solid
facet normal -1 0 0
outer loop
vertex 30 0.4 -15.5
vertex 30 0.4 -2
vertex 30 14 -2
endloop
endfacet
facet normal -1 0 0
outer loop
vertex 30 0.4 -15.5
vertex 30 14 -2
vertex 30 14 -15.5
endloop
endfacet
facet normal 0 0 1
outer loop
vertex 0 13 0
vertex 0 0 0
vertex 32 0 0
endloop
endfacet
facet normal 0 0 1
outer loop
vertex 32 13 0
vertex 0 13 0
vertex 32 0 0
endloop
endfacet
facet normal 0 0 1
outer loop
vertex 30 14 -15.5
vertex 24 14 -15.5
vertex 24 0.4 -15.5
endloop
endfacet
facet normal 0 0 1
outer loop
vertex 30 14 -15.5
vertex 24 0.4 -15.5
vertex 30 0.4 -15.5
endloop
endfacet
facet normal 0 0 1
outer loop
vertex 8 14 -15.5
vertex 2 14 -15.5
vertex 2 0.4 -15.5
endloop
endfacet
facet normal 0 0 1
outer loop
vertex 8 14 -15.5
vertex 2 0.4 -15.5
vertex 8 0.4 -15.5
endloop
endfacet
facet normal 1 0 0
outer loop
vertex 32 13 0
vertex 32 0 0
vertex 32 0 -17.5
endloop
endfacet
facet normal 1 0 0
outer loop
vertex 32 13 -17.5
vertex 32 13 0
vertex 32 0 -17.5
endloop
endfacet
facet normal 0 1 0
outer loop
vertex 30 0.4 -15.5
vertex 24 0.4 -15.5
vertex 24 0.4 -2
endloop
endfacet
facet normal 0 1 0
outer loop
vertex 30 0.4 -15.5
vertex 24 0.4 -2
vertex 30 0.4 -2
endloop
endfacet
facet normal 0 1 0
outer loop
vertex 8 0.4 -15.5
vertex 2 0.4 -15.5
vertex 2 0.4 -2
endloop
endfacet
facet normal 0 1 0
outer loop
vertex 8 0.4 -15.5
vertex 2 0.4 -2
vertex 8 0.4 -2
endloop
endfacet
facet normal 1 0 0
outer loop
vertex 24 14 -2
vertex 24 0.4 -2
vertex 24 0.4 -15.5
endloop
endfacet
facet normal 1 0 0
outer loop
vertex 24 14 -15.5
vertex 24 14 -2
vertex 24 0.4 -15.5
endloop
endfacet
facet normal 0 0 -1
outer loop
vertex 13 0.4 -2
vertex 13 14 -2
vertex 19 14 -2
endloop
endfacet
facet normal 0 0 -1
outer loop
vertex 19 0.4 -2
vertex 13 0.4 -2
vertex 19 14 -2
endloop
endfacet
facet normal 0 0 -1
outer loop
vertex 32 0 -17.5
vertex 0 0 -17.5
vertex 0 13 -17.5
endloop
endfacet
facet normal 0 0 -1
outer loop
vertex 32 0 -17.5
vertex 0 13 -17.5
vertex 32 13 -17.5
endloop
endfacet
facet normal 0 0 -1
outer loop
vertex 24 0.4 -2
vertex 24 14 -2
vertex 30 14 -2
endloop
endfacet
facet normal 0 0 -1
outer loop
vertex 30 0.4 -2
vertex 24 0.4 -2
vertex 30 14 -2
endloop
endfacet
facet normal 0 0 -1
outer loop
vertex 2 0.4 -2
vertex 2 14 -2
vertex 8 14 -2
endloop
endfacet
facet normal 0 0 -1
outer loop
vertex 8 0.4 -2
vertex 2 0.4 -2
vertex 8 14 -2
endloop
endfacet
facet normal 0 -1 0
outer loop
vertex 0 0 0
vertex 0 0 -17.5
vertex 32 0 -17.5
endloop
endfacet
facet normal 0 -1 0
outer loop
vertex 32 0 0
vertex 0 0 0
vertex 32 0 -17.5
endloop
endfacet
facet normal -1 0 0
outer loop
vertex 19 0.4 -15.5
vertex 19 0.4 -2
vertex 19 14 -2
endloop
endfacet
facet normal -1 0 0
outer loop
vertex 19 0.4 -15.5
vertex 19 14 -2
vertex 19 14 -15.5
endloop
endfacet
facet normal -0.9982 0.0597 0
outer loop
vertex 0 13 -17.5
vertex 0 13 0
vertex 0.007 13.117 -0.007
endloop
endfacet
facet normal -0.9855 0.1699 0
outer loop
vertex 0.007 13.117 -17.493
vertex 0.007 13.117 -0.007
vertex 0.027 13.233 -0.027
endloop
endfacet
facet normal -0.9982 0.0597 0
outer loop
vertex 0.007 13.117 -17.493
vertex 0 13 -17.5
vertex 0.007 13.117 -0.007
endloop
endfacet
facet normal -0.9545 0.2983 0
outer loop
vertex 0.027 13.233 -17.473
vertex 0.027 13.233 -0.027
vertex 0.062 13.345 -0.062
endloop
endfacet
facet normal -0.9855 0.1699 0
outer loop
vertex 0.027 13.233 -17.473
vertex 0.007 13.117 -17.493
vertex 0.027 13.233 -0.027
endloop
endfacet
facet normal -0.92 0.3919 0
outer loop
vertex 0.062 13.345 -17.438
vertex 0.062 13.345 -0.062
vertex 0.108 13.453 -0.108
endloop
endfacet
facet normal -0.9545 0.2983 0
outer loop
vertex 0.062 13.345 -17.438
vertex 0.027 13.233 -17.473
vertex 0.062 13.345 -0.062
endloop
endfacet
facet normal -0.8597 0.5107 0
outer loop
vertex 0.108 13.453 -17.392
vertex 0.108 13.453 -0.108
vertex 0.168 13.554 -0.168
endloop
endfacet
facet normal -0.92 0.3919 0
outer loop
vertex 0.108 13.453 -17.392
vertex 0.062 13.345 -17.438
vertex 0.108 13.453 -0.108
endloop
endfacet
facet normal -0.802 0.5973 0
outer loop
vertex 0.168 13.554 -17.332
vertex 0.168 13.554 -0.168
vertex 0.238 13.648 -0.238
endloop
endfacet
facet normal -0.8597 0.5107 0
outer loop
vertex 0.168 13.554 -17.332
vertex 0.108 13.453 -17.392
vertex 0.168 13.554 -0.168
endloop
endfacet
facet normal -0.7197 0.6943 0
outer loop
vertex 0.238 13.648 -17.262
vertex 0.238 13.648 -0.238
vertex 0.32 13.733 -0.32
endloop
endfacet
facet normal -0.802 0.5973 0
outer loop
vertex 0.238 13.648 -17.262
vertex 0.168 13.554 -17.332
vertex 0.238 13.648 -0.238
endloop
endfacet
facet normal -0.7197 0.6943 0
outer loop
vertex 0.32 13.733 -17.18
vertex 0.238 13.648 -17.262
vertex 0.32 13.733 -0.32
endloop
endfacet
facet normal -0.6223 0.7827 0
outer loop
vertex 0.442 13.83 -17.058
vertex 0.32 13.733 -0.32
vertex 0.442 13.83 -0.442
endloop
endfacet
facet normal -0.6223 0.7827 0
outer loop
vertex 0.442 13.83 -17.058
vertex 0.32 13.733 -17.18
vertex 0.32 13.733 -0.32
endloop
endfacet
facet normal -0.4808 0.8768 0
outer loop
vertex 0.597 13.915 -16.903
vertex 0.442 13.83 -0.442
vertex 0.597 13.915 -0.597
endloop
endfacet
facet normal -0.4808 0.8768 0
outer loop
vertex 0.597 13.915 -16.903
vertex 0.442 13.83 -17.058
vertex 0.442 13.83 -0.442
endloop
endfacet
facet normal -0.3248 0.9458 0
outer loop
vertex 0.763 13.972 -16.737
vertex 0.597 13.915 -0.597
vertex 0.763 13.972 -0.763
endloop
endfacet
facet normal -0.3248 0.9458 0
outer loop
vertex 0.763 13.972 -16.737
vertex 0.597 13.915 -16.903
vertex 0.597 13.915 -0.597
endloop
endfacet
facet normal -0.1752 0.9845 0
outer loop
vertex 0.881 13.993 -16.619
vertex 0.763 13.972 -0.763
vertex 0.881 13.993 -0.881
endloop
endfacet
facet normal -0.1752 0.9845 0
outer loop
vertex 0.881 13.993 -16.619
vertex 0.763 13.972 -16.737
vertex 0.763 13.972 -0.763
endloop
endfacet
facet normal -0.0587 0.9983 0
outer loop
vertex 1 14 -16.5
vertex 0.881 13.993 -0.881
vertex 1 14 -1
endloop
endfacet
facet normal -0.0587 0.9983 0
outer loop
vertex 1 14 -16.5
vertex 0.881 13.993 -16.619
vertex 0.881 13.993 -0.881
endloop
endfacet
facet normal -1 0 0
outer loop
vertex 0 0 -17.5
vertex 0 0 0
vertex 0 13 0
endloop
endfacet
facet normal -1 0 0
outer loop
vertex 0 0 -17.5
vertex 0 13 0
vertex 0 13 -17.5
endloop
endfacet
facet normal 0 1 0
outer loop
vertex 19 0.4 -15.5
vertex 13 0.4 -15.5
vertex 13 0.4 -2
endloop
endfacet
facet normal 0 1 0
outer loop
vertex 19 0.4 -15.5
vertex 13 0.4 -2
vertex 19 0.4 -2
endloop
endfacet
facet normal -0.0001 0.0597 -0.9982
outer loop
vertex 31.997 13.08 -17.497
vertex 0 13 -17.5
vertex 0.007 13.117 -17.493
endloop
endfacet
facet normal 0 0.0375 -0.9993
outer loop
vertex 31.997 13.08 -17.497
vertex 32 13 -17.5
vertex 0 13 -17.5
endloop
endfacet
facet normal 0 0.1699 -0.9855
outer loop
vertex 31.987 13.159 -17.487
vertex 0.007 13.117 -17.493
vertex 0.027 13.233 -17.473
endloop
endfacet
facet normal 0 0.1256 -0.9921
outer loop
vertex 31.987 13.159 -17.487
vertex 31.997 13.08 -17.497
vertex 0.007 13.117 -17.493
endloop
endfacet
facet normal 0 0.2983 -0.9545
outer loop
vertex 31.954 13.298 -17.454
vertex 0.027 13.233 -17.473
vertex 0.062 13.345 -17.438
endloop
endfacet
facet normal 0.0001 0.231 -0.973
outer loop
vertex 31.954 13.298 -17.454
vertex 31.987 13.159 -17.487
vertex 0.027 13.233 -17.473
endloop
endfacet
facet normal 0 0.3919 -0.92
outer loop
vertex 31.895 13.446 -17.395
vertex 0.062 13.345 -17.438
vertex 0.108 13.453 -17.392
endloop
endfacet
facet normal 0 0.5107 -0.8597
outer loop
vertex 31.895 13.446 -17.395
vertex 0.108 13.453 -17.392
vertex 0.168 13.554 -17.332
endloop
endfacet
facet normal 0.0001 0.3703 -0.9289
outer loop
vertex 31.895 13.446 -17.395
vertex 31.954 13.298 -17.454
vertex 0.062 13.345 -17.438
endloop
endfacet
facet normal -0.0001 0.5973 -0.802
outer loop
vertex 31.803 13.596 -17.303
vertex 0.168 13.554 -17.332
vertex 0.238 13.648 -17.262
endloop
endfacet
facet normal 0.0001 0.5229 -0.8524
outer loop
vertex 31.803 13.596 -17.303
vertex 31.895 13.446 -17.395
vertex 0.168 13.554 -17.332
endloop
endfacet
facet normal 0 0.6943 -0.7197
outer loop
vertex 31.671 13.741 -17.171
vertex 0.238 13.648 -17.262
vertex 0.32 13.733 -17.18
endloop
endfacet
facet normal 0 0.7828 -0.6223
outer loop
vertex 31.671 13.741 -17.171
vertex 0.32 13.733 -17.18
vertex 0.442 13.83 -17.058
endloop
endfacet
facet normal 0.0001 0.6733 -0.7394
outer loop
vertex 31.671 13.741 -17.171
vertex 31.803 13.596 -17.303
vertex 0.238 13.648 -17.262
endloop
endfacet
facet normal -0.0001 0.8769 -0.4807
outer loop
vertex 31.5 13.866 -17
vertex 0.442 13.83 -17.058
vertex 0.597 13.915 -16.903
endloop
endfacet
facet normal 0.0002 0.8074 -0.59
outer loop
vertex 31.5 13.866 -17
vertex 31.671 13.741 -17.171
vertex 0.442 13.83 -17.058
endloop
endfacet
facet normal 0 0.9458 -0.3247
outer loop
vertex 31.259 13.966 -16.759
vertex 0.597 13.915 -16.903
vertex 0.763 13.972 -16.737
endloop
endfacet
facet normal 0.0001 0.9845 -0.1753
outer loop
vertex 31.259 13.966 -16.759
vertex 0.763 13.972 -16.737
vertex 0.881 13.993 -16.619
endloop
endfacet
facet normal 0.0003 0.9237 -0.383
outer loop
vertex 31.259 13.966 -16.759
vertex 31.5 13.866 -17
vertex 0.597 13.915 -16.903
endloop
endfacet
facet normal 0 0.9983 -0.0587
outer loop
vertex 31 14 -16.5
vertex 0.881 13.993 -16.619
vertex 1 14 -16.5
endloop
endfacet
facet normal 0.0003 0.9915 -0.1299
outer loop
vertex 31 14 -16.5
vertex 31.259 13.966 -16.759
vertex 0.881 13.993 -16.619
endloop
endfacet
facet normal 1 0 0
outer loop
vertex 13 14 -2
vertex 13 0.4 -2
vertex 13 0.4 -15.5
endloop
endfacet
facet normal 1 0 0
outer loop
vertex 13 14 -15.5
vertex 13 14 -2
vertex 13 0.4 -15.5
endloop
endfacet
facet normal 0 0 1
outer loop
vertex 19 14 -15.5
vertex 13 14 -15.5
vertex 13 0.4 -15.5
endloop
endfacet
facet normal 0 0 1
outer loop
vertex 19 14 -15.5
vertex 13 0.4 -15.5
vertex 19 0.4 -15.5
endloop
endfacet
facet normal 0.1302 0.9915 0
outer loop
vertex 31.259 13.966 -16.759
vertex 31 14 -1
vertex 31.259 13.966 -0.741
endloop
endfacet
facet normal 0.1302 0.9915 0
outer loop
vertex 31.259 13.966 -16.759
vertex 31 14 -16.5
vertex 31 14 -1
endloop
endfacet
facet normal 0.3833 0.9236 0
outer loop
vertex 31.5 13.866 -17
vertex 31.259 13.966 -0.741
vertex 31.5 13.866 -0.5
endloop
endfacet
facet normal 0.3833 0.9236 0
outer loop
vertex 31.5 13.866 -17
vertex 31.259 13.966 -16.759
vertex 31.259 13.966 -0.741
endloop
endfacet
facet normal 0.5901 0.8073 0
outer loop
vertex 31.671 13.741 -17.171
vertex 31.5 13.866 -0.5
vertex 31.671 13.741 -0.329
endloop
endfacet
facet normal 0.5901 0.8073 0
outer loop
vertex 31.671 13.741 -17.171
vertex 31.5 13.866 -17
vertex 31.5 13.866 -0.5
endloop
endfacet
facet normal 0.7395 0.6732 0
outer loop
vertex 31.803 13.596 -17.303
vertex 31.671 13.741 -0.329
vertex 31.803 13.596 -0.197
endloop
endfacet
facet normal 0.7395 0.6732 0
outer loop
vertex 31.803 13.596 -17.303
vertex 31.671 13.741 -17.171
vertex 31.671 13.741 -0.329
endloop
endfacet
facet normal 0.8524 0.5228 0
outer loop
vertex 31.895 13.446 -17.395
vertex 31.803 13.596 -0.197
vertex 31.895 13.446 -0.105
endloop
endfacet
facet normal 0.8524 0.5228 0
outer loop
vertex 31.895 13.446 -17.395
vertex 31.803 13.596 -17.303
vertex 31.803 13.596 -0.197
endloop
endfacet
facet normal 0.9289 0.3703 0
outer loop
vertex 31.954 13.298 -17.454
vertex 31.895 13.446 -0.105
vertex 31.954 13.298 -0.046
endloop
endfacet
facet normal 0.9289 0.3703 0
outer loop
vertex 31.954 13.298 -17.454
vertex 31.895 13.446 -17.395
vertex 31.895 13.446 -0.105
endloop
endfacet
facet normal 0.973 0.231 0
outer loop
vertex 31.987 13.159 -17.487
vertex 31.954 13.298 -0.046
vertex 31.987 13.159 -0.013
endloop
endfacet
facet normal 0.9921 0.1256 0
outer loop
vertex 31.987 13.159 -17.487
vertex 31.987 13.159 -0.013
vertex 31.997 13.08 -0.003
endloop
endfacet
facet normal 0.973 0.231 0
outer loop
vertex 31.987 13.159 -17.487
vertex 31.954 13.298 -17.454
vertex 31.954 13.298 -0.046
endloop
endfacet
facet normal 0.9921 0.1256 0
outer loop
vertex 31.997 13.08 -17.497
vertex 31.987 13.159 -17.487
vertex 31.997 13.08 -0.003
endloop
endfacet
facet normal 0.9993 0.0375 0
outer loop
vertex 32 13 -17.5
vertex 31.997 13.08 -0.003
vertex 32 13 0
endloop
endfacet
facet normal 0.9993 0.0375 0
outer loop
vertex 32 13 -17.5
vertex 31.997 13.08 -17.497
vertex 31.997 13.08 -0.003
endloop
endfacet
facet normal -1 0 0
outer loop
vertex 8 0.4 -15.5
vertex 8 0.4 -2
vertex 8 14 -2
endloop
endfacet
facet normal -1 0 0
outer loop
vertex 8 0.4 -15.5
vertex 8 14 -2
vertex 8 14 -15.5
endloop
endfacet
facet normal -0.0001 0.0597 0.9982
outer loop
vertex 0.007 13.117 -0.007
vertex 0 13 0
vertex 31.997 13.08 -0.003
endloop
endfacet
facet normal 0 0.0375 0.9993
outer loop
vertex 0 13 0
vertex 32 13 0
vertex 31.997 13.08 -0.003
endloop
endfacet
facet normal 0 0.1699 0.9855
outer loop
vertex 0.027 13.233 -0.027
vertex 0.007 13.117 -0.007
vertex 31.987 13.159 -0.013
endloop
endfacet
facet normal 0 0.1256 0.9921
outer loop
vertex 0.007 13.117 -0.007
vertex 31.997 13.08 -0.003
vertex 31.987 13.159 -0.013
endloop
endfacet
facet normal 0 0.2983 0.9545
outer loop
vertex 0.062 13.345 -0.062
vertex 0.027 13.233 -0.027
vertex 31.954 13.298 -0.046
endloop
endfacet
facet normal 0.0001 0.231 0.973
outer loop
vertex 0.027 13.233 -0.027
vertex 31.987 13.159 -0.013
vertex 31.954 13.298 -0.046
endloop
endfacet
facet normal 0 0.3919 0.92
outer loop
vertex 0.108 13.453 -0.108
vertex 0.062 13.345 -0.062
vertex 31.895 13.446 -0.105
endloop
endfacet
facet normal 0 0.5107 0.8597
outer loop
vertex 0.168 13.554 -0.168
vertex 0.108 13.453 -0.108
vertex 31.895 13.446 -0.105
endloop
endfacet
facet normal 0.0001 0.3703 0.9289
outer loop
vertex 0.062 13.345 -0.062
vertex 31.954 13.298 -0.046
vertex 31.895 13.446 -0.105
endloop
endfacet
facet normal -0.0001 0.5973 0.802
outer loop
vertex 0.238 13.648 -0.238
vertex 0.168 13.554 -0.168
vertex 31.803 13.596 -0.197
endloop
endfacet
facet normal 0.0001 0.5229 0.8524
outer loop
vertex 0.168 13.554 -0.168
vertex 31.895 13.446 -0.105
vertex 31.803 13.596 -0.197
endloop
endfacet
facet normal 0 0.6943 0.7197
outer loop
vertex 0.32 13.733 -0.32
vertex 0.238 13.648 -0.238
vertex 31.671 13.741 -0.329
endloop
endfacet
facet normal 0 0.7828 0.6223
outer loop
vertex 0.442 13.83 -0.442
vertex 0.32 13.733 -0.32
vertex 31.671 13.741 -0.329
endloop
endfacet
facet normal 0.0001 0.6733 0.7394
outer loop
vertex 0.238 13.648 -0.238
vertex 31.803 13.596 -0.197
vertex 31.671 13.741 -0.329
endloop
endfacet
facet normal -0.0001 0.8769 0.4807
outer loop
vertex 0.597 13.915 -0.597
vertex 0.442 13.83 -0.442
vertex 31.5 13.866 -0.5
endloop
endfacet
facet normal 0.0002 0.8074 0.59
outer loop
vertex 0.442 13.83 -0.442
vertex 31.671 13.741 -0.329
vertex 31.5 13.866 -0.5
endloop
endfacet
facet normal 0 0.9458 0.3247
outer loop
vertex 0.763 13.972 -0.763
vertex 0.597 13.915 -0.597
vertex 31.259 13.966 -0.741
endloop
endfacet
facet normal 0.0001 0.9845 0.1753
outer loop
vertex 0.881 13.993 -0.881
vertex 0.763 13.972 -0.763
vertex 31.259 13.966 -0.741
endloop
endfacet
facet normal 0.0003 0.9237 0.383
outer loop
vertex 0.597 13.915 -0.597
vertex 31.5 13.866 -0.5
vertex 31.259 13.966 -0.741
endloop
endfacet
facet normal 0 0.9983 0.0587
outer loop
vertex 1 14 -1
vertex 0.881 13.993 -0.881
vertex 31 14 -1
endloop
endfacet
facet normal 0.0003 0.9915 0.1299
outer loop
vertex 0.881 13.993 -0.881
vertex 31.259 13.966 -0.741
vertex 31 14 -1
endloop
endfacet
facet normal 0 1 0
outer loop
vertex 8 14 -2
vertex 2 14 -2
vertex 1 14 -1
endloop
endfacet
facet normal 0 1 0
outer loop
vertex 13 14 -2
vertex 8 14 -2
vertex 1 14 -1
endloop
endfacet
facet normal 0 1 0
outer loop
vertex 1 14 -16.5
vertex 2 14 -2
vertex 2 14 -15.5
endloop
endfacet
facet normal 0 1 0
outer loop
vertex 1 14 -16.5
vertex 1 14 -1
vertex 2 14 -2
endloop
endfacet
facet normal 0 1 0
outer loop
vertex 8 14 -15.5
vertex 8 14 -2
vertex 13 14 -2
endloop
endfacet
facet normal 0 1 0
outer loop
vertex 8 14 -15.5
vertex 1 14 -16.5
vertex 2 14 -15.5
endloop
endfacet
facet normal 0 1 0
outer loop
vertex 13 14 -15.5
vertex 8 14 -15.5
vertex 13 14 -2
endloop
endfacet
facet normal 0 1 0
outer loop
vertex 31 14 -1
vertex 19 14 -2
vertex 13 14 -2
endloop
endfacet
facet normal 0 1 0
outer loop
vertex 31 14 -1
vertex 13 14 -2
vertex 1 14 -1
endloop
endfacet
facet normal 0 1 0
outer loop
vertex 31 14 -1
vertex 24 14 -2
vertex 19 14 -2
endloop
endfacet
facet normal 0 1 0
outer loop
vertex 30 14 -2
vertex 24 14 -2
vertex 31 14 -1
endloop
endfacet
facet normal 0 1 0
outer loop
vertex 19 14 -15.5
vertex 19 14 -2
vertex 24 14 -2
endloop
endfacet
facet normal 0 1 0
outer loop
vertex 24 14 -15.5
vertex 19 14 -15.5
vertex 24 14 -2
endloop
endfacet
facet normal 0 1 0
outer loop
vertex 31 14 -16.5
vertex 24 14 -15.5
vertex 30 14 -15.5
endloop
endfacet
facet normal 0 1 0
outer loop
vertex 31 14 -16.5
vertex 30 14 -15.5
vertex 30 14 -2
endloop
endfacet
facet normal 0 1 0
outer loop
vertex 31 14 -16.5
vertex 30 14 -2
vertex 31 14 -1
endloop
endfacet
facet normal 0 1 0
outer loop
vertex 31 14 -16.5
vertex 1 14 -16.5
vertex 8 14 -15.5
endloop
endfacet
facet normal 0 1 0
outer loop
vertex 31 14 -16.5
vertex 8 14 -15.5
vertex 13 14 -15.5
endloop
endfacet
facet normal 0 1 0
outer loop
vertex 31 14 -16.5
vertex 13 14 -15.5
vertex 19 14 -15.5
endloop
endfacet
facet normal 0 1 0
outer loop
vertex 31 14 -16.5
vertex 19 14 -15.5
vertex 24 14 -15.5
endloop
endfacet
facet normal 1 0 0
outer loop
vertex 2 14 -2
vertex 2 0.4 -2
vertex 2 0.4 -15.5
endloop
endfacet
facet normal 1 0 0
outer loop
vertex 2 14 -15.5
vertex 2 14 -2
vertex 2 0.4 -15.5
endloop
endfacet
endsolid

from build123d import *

# Parameters (mm, degrees)
SKETCH1_W           = 32
SKETCH1_H           = 17.5
BOSS_EXTRUDE1_DEPTH = 14
SKETCH2_W           = 6
SKETCH2_H           = 13.5
CUT_EXTRUDE1_DEPTH  = 13.6
LPATTERN1_COUNT     = 3
LPATTERN1_PITCH     = 11
FILLET1_R           = 1


with BuildPart() as part:
    # Sketch1 → Boss-Extrude1 (new body)
    with BuildSketch(Plane(origin=(0, 0, 0), x_dir=(1, 0, 0), z_dir=(0, 1, 0))):
        with Locations((16, 8.75)):
            Rectangle(SKETCH1_W, SKETCH1_H)
    extrude(amount=BOSS_EXTRUDE1_DEPTH)

    # Sketch2 → Cut-Extrude1 (cut)
    with BuildSketch(Plane(origin=(0, 14, 0), x_dir=(1, 0, 0), z_dir=(0, 1, 0))):
        with Locations((5, 8.75)):
            Rectangle(SKETCH2_W, SKETCH2_H)
    cut_extrude1 = extrude(amount=-CUT_EXTRUDE1_DEPTH, mode=Mode.SUBTRACT)

    # LPattern1: Cut-Extrude1 ×3
    with Locations(*[(i * LPATTERN1_PITCH, 0, 0) for i in range(1, LPATTERN1_COUNT)]):
        add(cut_extrude1, mode=Mode.SUBTRACT)

    # Fillet1
    fillet1_edges = [part.edges().sort_by_distance(p)[0] for p in [
        (32, 14, -8.75),
        (16, 14, -17.5),
        (0, 14, -8.75),
        (16, 14, 0),
    ]]
    fillet(fillet1_edges, radius=FILLET1_R)


solid = part.part
